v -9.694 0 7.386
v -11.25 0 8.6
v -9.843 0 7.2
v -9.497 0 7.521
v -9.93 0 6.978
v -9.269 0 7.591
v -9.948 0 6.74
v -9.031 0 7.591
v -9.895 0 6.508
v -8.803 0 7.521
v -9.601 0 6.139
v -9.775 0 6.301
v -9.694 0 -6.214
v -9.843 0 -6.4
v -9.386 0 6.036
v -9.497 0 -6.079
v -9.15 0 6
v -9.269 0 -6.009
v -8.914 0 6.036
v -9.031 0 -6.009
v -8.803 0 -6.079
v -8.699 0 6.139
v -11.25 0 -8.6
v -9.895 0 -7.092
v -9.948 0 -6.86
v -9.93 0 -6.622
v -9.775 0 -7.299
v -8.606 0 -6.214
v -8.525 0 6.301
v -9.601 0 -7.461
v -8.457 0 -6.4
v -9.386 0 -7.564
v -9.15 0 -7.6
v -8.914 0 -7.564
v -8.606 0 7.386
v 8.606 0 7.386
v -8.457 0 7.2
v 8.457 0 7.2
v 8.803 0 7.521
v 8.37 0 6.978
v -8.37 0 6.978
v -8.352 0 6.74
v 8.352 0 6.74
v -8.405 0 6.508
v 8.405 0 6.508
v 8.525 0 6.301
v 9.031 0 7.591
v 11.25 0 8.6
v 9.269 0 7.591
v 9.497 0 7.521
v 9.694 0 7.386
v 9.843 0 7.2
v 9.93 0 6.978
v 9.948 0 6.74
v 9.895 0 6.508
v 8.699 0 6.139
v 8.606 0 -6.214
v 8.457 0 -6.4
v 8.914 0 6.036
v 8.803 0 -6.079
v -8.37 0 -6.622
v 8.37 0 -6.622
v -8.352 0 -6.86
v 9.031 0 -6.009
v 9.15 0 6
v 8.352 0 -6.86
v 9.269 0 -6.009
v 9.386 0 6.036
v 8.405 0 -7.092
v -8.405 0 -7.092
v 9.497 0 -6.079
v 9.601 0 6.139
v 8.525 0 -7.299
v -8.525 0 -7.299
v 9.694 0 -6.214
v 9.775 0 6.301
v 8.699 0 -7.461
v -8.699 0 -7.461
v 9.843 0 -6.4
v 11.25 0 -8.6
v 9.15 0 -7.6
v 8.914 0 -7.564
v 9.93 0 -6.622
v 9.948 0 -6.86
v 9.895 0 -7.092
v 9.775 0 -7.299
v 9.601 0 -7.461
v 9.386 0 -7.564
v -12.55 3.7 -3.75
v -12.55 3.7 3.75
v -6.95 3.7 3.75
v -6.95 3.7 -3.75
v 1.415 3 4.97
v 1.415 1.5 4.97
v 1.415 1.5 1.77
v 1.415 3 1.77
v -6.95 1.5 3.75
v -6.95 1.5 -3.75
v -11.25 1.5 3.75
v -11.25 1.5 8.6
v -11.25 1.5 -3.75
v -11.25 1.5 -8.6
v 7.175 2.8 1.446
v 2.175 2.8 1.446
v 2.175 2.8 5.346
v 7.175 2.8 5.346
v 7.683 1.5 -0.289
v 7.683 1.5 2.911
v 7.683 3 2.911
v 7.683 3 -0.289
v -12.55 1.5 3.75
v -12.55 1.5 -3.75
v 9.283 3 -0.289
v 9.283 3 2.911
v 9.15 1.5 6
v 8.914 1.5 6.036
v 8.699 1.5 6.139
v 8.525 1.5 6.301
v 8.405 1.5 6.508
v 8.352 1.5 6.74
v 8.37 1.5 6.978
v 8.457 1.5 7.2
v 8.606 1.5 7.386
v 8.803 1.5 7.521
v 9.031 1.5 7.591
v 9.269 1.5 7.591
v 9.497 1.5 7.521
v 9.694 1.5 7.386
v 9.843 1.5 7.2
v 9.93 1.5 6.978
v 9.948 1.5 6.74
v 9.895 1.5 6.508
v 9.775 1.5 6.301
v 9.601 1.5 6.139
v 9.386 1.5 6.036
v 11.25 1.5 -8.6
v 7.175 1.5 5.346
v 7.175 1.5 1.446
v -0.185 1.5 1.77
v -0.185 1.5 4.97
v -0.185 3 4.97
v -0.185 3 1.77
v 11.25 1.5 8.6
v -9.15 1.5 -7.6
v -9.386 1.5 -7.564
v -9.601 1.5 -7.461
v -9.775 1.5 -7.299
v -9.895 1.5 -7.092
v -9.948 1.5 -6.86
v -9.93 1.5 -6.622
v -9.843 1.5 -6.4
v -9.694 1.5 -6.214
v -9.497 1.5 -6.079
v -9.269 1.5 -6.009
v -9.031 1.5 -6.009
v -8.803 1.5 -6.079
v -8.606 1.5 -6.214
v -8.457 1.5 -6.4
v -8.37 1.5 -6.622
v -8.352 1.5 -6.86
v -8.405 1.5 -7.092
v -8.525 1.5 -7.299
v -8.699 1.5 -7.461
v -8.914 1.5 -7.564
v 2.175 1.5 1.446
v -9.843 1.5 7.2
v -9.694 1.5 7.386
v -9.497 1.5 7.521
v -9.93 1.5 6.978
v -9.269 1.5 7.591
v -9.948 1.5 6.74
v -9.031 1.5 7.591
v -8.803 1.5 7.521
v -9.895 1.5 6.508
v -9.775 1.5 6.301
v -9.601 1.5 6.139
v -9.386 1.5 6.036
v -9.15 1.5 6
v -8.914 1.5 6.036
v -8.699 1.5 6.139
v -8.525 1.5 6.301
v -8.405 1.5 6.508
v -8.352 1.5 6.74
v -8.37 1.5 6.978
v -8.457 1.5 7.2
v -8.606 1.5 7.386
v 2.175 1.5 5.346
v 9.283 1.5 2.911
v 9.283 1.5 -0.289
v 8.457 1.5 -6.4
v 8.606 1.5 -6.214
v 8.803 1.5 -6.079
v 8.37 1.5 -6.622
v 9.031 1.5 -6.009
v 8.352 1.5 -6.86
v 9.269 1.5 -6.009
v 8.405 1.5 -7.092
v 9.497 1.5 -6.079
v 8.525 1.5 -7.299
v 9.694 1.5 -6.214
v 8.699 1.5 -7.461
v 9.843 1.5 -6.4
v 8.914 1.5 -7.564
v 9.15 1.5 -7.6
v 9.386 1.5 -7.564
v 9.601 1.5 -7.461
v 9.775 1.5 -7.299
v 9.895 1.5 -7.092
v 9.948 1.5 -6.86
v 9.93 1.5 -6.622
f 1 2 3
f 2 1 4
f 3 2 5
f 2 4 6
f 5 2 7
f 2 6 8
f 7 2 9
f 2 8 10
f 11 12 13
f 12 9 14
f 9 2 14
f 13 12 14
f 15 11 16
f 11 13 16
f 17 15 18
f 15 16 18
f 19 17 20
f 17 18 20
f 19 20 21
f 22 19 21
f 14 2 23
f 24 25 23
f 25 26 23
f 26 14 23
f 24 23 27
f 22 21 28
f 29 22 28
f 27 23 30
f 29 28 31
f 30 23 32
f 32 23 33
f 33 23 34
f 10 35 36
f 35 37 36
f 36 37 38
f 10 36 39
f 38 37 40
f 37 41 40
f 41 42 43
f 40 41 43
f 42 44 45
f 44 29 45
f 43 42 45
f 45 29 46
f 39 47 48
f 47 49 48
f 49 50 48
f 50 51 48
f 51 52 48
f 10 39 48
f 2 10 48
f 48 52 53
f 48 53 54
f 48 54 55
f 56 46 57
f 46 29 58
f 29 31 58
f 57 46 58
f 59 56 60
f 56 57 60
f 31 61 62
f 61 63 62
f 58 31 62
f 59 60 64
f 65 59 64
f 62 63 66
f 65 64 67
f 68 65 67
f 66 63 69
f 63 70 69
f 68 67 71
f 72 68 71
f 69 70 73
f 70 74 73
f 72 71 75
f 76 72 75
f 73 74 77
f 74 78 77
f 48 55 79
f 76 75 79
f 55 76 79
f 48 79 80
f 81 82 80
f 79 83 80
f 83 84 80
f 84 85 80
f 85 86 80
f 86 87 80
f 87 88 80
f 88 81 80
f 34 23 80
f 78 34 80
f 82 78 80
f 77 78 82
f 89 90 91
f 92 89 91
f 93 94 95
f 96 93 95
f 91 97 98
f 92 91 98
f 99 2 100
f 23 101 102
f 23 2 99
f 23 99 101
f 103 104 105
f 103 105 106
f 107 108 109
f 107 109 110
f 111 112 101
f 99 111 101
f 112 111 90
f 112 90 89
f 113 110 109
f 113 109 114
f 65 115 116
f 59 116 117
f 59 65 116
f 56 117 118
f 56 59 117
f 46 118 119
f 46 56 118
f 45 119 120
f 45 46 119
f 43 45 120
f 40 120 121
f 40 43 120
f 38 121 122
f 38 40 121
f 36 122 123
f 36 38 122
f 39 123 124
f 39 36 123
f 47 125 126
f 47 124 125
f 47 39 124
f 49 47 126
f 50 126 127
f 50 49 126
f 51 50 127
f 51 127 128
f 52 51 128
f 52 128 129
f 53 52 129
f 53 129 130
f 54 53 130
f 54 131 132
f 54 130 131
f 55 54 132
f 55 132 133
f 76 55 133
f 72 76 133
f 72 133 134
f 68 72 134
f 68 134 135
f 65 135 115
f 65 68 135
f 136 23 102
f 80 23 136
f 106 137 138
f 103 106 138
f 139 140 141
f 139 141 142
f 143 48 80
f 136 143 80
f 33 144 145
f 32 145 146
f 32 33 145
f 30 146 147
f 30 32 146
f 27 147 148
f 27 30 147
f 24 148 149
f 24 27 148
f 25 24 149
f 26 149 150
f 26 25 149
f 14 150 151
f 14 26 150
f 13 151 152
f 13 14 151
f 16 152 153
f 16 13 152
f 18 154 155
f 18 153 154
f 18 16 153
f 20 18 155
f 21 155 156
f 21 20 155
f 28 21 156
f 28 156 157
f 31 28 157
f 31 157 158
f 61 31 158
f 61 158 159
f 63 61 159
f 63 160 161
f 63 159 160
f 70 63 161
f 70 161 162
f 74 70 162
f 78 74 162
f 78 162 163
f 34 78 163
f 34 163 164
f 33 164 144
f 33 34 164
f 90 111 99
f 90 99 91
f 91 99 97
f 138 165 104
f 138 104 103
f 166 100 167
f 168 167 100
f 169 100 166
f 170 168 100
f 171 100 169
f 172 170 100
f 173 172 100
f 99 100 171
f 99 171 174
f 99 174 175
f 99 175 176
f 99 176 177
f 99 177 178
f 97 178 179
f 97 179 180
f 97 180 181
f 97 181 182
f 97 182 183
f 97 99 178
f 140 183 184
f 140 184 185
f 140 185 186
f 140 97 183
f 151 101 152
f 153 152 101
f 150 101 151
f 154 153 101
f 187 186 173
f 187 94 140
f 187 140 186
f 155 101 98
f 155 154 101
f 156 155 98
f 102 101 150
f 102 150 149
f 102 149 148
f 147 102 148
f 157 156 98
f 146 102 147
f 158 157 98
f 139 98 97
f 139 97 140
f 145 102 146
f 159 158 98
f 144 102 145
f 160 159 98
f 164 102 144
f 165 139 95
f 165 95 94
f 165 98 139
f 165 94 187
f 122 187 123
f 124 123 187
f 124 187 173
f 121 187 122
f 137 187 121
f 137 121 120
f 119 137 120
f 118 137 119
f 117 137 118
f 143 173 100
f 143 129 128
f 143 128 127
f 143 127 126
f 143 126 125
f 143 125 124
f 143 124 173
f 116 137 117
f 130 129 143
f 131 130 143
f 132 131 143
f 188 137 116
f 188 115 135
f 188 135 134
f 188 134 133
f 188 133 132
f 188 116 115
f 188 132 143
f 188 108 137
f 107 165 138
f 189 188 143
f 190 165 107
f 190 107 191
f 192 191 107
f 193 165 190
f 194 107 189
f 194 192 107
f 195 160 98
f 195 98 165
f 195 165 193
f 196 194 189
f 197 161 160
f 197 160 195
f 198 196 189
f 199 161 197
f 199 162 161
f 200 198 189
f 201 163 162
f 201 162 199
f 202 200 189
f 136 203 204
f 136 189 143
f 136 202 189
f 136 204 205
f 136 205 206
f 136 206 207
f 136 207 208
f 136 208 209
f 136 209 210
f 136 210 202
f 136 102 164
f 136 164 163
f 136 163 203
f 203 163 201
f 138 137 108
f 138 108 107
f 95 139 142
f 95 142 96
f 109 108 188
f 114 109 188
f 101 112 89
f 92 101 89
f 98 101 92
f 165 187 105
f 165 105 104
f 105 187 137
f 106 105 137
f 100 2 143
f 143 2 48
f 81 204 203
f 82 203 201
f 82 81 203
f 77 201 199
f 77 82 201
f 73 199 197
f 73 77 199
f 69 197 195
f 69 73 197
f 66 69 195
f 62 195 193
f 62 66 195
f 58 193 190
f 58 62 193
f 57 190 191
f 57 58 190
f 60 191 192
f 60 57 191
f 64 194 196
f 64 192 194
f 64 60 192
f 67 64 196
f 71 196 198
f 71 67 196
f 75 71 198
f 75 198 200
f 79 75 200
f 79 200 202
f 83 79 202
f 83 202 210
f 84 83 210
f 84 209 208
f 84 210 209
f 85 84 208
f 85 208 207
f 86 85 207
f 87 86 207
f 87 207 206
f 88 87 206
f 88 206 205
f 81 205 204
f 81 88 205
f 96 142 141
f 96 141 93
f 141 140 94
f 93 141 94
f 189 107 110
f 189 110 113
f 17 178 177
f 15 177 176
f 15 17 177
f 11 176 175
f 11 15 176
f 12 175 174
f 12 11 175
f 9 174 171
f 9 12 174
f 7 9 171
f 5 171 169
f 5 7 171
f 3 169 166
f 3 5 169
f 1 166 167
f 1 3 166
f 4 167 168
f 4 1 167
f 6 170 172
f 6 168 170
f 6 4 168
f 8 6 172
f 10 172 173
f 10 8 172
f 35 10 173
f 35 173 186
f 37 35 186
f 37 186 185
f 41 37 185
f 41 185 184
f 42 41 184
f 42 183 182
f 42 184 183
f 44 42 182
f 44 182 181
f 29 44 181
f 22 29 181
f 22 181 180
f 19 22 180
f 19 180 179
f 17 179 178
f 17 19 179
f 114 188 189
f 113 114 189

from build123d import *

# Parameters (mm, degrees)
SKETCH1_W           = 22.5
SKETCH1_H           = 17.2
BOSS_EXTRUDE1_DEPTH = 1.5
SKETCH2_W           = 1.6
SKETCH2_H           = 3.2
BOSS_EXTRUDE2_DEPTH = 1.5
SKETCH2_3_W         = 5
SKETCH2_3_H         = 3.9
BOSS_EXTRUDE3_DEPTH = 1.3
SKETCH3_W           = 5.6
SKETCH3_H           = 7.5
BOSS_EXTRUDE4_DEPTH = 2.2
SKETCH4_R           = 0.8
CUT_EXTRUDE1_DEPTH  = 16.657346518


with BuildPart() as part:
    # Sketch1 → Boss-Extrude1 (new body)
    with BuildSketch(Plane(origin=(0, 0, 0), x_dir=(1, 0, 0), z_dir=(0, 1, 0))):
        Rectangle(SKETCH1_W, SKETCH1_H)
    extrude(amount=BOSS_EXTRUDE1_DEPTH)

    # Sketch2 → Boss-Extrude2 (add)
    with BuildSketch(Plane(origin=(0, 1.5, 0), x_dir=(1, 0, 0), z_dir=(0, 1, 0))):
        with Locations((8.482597382, -1.31074558)):
            Rectangle(SKETCH2_W, SKETCH2_H)
        with Locations((0.614877172, -3.370237047)):
            Rectangle(SKETCH2_W, SKETCH2_H)
    extrude(amount=BOSS_EXTRUDE2_DEPTH)

    # Sketch2<3> → Boss-Extrude3 (add)
    with BuildSketch(Plane(origin=(0, 1.5, 0), x_dir=(1, 0, 0), z_dir=(0, 1, 0))):
        with Locations((4.675193235, -3.396272098)):
            Rectangle(SKETCH2_3_W, SKETCH2_3_H)
    extrude(amount=BOSS_EXTRUDE3_DEPTH)

    # Sketch3 → Boss-Extrude4 (add)
    with BuildSketch(Plane(origin=(0, 1.5, 0), x_dir=(1, 0, 0), z_dir=(0, 1, 0))):
        with Locations((-9.75, 0)):
            Rectangle(SKETCH3_W, SKETCH3_H)
    extrude(amount=BOSS_EXTRUDE4_DEPTH)

    # Sketch4 → Cut-Extrude1 (cut, through all)
    with BuildSketch(Plane(origin=(0, 0, 0), x_dir=(1, 0, 0), z_dir=(0, 1, 0))):
        with Locations((-9.15, 6.8)):
            Circle(SKETCH4_R)
        with Locations((-9.15, -6.8)):
            Circle(SKETCH4_R)
        with Locations((9.15, -6.8)):
            Circle(SKETCH4_R)
        with Locations((9.15, 6.8)):
            Circle(SKETCH4_R)
    extrude(amount=CUT_EXTRUDE1_DEPTH, mode=Mode.SUBTRACT)


solid = part.part
